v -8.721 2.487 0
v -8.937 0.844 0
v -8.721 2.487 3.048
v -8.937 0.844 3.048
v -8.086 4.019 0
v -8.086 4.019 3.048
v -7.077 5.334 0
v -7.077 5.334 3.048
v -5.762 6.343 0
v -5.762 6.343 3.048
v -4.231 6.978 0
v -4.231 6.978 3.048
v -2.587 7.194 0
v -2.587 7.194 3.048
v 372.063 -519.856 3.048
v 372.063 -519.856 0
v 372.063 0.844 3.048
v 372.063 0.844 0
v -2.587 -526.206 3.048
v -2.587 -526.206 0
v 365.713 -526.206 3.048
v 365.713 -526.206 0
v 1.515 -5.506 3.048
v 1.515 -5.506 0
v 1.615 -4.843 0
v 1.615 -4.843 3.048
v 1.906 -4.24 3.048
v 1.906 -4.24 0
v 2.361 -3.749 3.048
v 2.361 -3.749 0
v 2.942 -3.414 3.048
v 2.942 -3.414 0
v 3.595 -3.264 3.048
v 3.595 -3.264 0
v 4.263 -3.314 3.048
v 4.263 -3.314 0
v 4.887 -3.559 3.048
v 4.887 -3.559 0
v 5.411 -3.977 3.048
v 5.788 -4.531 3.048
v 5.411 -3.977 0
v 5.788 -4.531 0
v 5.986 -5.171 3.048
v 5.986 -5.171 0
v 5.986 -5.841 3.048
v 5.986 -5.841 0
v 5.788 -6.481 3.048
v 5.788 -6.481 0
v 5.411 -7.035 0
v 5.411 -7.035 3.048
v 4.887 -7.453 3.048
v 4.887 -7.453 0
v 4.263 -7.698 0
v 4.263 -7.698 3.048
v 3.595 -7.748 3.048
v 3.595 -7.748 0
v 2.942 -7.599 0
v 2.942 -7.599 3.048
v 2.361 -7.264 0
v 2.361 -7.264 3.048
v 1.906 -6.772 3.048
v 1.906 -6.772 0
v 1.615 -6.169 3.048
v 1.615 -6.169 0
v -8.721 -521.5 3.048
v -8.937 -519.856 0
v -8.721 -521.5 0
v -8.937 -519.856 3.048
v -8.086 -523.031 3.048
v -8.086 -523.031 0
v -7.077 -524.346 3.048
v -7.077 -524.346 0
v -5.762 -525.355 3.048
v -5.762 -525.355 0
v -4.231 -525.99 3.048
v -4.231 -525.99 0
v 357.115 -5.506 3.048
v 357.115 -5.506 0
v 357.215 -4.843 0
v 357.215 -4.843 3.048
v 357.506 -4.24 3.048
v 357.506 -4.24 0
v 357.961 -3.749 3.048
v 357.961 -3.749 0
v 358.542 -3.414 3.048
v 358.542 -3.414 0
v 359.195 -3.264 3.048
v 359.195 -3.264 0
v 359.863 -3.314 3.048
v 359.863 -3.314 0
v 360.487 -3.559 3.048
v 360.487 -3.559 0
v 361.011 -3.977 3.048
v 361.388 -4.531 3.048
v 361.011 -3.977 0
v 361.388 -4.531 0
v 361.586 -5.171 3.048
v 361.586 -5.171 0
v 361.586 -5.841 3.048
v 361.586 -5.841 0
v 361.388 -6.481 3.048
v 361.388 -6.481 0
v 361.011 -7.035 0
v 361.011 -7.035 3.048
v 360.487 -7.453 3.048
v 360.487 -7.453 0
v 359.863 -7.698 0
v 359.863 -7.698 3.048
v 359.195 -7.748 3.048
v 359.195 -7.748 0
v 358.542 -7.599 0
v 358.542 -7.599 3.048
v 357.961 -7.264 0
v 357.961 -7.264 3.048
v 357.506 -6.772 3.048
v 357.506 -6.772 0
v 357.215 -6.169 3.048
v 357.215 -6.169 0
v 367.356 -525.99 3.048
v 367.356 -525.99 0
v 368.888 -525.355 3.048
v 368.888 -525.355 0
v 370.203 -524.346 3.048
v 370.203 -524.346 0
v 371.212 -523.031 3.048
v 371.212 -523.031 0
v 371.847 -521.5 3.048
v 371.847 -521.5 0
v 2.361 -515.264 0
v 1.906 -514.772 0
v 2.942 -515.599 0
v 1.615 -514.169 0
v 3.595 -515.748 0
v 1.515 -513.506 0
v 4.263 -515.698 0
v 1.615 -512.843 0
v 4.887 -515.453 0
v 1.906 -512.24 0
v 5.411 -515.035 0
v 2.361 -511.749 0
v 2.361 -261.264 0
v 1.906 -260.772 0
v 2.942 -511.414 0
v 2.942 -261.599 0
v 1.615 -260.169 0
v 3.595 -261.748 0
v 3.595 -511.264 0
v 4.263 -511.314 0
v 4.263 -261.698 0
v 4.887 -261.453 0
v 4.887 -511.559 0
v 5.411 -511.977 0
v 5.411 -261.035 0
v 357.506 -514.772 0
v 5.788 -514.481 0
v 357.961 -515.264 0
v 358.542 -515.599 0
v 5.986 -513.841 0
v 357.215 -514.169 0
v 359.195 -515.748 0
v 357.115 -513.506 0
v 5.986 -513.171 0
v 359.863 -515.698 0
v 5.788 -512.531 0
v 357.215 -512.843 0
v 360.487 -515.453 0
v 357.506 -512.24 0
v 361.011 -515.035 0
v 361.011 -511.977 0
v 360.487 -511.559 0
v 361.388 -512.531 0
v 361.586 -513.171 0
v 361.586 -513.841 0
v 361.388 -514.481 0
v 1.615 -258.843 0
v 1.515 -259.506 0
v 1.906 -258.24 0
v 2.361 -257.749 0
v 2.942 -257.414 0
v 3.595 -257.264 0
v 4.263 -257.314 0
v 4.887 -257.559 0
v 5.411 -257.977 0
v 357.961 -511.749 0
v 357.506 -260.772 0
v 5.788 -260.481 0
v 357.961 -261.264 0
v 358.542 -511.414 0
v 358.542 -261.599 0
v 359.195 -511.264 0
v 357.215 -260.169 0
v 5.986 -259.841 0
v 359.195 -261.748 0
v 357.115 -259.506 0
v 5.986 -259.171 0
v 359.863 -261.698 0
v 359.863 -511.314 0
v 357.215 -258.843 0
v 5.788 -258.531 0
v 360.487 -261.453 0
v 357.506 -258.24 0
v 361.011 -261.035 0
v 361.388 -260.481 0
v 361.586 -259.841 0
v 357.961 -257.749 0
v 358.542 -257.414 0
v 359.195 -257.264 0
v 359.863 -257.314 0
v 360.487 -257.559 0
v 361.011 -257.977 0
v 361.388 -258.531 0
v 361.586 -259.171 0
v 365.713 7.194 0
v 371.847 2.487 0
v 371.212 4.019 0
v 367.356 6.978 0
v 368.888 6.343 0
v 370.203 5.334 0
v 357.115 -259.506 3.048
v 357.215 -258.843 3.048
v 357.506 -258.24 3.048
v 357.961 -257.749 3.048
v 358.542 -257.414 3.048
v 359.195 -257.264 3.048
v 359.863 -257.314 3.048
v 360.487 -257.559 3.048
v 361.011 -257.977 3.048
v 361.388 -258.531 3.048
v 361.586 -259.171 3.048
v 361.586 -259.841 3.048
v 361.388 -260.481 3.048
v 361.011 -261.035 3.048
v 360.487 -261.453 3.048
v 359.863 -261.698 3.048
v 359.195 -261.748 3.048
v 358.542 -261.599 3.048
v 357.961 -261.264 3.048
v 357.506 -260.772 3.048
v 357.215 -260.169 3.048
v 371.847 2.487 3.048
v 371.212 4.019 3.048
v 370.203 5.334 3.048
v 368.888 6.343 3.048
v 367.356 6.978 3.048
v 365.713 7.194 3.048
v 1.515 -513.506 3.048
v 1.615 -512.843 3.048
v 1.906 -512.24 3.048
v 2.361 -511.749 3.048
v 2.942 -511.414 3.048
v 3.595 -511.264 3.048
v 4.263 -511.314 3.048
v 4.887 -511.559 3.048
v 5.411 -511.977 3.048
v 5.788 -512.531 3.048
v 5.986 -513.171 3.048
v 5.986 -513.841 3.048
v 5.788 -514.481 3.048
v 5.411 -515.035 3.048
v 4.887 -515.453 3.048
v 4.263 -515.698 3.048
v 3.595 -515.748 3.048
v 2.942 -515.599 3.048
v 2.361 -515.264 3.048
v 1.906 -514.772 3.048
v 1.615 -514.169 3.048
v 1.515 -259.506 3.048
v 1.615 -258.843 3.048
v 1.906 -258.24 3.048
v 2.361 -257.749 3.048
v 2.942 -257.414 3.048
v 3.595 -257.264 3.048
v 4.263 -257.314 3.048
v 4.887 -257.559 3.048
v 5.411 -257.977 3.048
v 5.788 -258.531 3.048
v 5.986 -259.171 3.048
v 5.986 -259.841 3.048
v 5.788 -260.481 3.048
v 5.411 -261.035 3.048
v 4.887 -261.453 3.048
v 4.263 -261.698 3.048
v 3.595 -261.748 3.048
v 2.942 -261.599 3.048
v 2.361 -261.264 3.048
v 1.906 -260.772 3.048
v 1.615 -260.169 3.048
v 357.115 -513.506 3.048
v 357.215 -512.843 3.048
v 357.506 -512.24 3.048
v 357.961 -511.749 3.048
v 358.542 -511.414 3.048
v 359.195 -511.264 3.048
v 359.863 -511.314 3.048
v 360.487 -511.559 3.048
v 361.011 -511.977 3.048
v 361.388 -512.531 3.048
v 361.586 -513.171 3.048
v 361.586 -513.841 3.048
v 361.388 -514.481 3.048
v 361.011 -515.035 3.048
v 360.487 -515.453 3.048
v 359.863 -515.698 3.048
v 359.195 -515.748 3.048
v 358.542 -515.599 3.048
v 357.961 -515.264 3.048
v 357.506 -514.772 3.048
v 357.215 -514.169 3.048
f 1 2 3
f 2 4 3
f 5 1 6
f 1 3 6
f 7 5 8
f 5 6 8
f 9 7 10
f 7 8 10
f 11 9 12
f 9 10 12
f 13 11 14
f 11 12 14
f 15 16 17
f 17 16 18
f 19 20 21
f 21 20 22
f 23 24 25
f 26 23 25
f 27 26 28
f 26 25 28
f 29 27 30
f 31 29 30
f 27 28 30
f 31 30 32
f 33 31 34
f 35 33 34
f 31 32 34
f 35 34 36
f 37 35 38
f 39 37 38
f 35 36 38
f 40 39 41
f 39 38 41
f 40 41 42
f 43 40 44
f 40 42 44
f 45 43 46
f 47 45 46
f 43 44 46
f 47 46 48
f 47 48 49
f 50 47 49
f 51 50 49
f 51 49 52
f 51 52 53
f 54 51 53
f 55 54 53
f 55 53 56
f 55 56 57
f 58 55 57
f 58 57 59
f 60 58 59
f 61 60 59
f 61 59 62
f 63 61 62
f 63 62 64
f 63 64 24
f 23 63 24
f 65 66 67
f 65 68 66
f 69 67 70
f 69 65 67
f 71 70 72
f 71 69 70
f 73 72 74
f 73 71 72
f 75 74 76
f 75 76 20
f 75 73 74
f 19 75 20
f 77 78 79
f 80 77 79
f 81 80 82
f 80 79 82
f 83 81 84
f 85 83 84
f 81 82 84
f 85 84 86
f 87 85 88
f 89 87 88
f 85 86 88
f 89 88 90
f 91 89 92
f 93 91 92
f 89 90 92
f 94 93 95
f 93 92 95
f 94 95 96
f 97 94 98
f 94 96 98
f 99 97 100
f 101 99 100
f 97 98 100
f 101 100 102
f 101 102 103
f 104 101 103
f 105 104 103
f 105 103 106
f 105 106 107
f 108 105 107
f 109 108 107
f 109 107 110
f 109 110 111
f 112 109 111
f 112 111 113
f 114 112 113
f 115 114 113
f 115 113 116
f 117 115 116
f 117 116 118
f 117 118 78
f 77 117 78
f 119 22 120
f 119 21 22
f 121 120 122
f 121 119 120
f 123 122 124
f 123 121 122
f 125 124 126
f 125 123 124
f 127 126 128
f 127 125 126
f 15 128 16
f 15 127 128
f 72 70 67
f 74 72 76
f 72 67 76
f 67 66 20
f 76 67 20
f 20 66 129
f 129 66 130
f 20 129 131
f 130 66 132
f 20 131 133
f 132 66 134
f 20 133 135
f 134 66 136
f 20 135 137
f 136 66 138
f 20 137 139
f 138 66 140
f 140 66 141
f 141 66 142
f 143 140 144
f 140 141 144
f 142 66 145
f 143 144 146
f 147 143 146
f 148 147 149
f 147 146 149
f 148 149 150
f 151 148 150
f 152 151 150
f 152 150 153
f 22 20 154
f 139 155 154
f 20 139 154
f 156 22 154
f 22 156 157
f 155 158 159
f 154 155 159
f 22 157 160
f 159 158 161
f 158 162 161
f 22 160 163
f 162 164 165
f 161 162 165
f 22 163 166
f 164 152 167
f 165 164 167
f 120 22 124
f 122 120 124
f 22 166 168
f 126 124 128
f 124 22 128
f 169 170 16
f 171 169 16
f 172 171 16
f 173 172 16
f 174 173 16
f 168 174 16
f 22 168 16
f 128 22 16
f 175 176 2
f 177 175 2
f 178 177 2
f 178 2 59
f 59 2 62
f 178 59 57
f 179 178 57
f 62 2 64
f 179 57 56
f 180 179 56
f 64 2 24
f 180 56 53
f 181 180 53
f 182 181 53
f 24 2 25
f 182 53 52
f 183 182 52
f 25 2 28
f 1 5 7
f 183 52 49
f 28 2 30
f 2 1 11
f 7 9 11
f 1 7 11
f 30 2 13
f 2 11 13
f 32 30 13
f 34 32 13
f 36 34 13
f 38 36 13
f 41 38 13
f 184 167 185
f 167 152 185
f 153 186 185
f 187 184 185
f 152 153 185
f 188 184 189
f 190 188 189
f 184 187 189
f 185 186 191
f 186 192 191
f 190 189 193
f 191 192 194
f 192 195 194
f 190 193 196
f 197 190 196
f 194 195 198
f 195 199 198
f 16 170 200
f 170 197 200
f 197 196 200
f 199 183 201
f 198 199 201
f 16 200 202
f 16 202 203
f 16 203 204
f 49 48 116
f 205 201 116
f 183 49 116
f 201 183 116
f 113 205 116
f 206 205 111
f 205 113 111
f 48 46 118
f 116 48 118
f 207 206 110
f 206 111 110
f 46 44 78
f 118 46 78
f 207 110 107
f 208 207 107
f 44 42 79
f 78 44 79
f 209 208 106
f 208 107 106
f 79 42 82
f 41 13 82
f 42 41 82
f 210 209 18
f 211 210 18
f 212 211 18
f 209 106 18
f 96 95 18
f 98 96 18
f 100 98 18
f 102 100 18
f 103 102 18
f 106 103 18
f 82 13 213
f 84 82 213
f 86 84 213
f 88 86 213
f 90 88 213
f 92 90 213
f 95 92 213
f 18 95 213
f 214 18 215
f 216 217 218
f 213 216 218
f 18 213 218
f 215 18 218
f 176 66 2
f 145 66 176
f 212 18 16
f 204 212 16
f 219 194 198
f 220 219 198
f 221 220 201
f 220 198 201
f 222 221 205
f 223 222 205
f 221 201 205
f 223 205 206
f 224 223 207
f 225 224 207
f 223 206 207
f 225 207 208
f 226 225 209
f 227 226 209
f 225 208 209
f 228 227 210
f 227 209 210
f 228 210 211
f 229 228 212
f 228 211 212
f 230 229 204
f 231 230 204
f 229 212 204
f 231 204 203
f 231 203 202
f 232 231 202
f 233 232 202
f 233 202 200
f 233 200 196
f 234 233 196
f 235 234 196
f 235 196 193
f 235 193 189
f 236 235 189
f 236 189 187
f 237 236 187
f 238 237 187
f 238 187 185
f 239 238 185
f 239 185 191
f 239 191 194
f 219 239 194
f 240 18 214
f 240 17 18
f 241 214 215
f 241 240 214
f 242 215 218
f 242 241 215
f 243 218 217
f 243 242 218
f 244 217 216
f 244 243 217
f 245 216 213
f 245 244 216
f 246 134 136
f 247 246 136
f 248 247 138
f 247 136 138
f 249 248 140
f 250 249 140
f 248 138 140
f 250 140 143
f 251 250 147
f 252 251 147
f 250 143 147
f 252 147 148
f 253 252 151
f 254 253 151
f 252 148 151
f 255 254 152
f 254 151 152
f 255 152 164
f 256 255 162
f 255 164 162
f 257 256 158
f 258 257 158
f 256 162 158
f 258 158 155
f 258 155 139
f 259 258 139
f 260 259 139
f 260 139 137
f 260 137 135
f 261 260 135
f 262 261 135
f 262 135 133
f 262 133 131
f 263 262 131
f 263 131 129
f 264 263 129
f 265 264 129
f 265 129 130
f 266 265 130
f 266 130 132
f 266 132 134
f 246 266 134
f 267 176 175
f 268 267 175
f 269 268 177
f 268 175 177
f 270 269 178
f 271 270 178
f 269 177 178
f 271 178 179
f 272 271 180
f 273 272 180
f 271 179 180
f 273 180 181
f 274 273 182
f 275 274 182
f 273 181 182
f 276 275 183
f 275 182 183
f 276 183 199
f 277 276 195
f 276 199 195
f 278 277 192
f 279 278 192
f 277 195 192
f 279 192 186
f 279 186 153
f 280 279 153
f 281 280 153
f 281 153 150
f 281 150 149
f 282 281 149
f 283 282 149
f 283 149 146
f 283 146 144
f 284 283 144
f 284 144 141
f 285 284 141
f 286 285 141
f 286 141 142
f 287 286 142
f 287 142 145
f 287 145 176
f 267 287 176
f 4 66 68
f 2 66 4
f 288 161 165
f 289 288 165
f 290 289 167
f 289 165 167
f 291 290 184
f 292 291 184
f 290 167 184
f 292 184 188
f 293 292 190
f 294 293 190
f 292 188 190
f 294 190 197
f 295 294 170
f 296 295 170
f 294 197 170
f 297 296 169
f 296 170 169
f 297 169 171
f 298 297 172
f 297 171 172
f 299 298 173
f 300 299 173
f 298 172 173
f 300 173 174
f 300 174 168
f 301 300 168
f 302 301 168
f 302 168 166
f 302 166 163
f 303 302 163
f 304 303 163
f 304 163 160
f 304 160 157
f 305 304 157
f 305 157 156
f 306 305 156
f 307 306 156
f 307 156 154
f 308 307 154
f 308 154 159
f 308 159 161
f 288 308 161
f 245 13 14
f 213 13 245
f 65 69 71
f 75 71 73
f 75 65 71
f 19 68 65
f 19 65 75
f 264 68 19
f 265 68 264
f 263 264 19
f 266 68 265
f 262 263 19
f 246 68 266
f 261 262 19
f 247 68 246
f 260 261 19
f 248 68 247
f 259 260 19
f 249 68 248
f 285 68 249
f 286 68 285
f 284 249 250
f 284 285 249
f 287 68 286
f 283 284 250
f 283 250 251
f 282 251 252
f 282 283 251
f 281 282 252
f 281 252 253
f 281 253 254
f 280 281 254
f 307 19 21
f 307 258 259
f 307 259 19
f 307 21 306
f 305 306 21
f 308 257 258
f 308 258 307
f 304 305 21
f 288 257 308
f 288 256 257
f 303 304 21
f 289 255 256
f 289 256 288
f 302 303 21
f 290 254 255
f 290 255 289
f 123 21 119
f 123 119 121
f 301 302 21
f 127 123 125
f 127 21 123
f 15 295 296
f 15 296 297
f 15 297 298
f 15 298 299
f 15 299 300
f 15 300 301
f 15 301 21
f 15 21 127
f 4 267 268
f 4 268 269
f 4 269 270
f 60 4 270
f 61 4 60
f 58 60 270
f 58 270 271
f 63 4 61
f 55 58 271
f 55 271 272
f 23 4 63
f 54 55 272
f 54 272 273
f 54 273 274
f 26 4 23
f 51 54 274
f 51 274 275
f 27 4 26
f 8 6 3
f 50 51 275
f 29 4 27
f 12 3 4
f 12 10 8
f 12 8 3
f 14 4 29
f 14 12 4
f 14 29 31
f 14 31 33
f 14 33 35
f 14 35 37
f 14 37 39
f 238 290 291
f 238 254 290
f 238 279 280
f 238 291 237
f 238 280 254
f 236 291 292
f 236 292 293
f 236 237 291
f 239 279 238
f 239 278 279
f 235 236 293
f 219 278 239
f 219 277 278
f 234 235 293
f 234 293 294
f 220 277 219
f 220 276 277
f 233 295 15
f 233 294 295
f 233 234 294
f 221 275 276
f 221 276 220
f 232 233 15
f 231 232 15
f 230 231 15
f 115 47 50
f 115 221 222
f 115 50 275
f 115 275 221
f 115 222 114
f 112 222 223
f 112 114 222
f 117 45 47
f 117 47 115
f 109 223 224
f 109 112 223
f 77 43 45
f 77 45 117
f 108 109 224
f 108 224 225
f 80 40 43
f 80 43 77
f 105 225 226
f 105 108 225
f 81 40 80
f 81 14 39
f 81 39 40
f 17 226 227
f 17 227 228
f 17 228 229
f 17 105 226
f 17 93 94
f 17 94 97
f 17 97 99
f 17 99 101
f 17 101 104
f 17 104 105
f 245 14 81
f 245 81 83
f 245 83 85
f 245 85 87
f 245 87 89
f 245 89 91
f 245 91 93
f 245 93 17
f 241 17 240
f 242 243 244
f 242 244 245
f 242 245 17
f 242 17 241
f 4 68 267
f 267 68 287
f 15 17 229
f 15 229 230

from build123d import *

# Parameters (mm, degrees)
SKETCH1_W                 = 381
SKETCH1_H                 = 533.4
BOSS_EXTRUDE1_DEPTH       = 3.048
FILLET1_R                 = 6.35
F_8_CLEARANCE_SLOT1_D     = 4.4958
F_8_CLEARANCE_SLOT1_DEPTH = 9.652
F_8_CLEARANCE_SLOT1_TIP   = 1.350674586


with BuildPart() as part:
    # Sketch1 → Boss-Extrude1 (new body)
    with BuildSketch(Plane.XY):
        with Locations((181.562957728, -259.506034901)):
            Rectangle(SKETCH1_W, SKETCH1_H)
    extrude(amount=BOSS_EXTRUDE1_DEPTH)

    # Fillet1
    fillet1_edges = [part.edges().sort_by_distance(p)[0] for p in [
        (-8.937042272, 7.193965099, 1.524),
        (372.062957728, 7.193965099, 1.524),
        (372.062957728, -526.206034901, 1.524),
        (-8.937042272, -526.206034901, 1.524),
    ]]
    fillet(fillet1_edges, radius=FILLET1_R)

    # #8 Clearance Slot1
    with Locations(Plane.XY.offset(3.048)):
        with Locations((3.762957728, -5.506034901), (3.762957728, -259.506034901), (3.762957728, -513.506034901), (359.362957728, -513.506034901), (359.362957728, -259.506034901), (359.362957728, -5.506034901)):
            Hole(F_8_CLEARANCE_SLOT1_D / 2, depth=F_8_CLEARANCE_SLOT1_DEPTH)
            with Locations((0, 0, -(F_8_CLEARANCE_SLOT1_DEPTH + F_8_CLEARANCE_SLOT1_TIP / 2))):  # 118° drill point
                Cone(0, F_8_CLEARANCE_SLOT1_D / 2, F_8_CLEARANCE_SLOT1_TIP, mode=Mode.SUBTRACT)


solid = part.part
